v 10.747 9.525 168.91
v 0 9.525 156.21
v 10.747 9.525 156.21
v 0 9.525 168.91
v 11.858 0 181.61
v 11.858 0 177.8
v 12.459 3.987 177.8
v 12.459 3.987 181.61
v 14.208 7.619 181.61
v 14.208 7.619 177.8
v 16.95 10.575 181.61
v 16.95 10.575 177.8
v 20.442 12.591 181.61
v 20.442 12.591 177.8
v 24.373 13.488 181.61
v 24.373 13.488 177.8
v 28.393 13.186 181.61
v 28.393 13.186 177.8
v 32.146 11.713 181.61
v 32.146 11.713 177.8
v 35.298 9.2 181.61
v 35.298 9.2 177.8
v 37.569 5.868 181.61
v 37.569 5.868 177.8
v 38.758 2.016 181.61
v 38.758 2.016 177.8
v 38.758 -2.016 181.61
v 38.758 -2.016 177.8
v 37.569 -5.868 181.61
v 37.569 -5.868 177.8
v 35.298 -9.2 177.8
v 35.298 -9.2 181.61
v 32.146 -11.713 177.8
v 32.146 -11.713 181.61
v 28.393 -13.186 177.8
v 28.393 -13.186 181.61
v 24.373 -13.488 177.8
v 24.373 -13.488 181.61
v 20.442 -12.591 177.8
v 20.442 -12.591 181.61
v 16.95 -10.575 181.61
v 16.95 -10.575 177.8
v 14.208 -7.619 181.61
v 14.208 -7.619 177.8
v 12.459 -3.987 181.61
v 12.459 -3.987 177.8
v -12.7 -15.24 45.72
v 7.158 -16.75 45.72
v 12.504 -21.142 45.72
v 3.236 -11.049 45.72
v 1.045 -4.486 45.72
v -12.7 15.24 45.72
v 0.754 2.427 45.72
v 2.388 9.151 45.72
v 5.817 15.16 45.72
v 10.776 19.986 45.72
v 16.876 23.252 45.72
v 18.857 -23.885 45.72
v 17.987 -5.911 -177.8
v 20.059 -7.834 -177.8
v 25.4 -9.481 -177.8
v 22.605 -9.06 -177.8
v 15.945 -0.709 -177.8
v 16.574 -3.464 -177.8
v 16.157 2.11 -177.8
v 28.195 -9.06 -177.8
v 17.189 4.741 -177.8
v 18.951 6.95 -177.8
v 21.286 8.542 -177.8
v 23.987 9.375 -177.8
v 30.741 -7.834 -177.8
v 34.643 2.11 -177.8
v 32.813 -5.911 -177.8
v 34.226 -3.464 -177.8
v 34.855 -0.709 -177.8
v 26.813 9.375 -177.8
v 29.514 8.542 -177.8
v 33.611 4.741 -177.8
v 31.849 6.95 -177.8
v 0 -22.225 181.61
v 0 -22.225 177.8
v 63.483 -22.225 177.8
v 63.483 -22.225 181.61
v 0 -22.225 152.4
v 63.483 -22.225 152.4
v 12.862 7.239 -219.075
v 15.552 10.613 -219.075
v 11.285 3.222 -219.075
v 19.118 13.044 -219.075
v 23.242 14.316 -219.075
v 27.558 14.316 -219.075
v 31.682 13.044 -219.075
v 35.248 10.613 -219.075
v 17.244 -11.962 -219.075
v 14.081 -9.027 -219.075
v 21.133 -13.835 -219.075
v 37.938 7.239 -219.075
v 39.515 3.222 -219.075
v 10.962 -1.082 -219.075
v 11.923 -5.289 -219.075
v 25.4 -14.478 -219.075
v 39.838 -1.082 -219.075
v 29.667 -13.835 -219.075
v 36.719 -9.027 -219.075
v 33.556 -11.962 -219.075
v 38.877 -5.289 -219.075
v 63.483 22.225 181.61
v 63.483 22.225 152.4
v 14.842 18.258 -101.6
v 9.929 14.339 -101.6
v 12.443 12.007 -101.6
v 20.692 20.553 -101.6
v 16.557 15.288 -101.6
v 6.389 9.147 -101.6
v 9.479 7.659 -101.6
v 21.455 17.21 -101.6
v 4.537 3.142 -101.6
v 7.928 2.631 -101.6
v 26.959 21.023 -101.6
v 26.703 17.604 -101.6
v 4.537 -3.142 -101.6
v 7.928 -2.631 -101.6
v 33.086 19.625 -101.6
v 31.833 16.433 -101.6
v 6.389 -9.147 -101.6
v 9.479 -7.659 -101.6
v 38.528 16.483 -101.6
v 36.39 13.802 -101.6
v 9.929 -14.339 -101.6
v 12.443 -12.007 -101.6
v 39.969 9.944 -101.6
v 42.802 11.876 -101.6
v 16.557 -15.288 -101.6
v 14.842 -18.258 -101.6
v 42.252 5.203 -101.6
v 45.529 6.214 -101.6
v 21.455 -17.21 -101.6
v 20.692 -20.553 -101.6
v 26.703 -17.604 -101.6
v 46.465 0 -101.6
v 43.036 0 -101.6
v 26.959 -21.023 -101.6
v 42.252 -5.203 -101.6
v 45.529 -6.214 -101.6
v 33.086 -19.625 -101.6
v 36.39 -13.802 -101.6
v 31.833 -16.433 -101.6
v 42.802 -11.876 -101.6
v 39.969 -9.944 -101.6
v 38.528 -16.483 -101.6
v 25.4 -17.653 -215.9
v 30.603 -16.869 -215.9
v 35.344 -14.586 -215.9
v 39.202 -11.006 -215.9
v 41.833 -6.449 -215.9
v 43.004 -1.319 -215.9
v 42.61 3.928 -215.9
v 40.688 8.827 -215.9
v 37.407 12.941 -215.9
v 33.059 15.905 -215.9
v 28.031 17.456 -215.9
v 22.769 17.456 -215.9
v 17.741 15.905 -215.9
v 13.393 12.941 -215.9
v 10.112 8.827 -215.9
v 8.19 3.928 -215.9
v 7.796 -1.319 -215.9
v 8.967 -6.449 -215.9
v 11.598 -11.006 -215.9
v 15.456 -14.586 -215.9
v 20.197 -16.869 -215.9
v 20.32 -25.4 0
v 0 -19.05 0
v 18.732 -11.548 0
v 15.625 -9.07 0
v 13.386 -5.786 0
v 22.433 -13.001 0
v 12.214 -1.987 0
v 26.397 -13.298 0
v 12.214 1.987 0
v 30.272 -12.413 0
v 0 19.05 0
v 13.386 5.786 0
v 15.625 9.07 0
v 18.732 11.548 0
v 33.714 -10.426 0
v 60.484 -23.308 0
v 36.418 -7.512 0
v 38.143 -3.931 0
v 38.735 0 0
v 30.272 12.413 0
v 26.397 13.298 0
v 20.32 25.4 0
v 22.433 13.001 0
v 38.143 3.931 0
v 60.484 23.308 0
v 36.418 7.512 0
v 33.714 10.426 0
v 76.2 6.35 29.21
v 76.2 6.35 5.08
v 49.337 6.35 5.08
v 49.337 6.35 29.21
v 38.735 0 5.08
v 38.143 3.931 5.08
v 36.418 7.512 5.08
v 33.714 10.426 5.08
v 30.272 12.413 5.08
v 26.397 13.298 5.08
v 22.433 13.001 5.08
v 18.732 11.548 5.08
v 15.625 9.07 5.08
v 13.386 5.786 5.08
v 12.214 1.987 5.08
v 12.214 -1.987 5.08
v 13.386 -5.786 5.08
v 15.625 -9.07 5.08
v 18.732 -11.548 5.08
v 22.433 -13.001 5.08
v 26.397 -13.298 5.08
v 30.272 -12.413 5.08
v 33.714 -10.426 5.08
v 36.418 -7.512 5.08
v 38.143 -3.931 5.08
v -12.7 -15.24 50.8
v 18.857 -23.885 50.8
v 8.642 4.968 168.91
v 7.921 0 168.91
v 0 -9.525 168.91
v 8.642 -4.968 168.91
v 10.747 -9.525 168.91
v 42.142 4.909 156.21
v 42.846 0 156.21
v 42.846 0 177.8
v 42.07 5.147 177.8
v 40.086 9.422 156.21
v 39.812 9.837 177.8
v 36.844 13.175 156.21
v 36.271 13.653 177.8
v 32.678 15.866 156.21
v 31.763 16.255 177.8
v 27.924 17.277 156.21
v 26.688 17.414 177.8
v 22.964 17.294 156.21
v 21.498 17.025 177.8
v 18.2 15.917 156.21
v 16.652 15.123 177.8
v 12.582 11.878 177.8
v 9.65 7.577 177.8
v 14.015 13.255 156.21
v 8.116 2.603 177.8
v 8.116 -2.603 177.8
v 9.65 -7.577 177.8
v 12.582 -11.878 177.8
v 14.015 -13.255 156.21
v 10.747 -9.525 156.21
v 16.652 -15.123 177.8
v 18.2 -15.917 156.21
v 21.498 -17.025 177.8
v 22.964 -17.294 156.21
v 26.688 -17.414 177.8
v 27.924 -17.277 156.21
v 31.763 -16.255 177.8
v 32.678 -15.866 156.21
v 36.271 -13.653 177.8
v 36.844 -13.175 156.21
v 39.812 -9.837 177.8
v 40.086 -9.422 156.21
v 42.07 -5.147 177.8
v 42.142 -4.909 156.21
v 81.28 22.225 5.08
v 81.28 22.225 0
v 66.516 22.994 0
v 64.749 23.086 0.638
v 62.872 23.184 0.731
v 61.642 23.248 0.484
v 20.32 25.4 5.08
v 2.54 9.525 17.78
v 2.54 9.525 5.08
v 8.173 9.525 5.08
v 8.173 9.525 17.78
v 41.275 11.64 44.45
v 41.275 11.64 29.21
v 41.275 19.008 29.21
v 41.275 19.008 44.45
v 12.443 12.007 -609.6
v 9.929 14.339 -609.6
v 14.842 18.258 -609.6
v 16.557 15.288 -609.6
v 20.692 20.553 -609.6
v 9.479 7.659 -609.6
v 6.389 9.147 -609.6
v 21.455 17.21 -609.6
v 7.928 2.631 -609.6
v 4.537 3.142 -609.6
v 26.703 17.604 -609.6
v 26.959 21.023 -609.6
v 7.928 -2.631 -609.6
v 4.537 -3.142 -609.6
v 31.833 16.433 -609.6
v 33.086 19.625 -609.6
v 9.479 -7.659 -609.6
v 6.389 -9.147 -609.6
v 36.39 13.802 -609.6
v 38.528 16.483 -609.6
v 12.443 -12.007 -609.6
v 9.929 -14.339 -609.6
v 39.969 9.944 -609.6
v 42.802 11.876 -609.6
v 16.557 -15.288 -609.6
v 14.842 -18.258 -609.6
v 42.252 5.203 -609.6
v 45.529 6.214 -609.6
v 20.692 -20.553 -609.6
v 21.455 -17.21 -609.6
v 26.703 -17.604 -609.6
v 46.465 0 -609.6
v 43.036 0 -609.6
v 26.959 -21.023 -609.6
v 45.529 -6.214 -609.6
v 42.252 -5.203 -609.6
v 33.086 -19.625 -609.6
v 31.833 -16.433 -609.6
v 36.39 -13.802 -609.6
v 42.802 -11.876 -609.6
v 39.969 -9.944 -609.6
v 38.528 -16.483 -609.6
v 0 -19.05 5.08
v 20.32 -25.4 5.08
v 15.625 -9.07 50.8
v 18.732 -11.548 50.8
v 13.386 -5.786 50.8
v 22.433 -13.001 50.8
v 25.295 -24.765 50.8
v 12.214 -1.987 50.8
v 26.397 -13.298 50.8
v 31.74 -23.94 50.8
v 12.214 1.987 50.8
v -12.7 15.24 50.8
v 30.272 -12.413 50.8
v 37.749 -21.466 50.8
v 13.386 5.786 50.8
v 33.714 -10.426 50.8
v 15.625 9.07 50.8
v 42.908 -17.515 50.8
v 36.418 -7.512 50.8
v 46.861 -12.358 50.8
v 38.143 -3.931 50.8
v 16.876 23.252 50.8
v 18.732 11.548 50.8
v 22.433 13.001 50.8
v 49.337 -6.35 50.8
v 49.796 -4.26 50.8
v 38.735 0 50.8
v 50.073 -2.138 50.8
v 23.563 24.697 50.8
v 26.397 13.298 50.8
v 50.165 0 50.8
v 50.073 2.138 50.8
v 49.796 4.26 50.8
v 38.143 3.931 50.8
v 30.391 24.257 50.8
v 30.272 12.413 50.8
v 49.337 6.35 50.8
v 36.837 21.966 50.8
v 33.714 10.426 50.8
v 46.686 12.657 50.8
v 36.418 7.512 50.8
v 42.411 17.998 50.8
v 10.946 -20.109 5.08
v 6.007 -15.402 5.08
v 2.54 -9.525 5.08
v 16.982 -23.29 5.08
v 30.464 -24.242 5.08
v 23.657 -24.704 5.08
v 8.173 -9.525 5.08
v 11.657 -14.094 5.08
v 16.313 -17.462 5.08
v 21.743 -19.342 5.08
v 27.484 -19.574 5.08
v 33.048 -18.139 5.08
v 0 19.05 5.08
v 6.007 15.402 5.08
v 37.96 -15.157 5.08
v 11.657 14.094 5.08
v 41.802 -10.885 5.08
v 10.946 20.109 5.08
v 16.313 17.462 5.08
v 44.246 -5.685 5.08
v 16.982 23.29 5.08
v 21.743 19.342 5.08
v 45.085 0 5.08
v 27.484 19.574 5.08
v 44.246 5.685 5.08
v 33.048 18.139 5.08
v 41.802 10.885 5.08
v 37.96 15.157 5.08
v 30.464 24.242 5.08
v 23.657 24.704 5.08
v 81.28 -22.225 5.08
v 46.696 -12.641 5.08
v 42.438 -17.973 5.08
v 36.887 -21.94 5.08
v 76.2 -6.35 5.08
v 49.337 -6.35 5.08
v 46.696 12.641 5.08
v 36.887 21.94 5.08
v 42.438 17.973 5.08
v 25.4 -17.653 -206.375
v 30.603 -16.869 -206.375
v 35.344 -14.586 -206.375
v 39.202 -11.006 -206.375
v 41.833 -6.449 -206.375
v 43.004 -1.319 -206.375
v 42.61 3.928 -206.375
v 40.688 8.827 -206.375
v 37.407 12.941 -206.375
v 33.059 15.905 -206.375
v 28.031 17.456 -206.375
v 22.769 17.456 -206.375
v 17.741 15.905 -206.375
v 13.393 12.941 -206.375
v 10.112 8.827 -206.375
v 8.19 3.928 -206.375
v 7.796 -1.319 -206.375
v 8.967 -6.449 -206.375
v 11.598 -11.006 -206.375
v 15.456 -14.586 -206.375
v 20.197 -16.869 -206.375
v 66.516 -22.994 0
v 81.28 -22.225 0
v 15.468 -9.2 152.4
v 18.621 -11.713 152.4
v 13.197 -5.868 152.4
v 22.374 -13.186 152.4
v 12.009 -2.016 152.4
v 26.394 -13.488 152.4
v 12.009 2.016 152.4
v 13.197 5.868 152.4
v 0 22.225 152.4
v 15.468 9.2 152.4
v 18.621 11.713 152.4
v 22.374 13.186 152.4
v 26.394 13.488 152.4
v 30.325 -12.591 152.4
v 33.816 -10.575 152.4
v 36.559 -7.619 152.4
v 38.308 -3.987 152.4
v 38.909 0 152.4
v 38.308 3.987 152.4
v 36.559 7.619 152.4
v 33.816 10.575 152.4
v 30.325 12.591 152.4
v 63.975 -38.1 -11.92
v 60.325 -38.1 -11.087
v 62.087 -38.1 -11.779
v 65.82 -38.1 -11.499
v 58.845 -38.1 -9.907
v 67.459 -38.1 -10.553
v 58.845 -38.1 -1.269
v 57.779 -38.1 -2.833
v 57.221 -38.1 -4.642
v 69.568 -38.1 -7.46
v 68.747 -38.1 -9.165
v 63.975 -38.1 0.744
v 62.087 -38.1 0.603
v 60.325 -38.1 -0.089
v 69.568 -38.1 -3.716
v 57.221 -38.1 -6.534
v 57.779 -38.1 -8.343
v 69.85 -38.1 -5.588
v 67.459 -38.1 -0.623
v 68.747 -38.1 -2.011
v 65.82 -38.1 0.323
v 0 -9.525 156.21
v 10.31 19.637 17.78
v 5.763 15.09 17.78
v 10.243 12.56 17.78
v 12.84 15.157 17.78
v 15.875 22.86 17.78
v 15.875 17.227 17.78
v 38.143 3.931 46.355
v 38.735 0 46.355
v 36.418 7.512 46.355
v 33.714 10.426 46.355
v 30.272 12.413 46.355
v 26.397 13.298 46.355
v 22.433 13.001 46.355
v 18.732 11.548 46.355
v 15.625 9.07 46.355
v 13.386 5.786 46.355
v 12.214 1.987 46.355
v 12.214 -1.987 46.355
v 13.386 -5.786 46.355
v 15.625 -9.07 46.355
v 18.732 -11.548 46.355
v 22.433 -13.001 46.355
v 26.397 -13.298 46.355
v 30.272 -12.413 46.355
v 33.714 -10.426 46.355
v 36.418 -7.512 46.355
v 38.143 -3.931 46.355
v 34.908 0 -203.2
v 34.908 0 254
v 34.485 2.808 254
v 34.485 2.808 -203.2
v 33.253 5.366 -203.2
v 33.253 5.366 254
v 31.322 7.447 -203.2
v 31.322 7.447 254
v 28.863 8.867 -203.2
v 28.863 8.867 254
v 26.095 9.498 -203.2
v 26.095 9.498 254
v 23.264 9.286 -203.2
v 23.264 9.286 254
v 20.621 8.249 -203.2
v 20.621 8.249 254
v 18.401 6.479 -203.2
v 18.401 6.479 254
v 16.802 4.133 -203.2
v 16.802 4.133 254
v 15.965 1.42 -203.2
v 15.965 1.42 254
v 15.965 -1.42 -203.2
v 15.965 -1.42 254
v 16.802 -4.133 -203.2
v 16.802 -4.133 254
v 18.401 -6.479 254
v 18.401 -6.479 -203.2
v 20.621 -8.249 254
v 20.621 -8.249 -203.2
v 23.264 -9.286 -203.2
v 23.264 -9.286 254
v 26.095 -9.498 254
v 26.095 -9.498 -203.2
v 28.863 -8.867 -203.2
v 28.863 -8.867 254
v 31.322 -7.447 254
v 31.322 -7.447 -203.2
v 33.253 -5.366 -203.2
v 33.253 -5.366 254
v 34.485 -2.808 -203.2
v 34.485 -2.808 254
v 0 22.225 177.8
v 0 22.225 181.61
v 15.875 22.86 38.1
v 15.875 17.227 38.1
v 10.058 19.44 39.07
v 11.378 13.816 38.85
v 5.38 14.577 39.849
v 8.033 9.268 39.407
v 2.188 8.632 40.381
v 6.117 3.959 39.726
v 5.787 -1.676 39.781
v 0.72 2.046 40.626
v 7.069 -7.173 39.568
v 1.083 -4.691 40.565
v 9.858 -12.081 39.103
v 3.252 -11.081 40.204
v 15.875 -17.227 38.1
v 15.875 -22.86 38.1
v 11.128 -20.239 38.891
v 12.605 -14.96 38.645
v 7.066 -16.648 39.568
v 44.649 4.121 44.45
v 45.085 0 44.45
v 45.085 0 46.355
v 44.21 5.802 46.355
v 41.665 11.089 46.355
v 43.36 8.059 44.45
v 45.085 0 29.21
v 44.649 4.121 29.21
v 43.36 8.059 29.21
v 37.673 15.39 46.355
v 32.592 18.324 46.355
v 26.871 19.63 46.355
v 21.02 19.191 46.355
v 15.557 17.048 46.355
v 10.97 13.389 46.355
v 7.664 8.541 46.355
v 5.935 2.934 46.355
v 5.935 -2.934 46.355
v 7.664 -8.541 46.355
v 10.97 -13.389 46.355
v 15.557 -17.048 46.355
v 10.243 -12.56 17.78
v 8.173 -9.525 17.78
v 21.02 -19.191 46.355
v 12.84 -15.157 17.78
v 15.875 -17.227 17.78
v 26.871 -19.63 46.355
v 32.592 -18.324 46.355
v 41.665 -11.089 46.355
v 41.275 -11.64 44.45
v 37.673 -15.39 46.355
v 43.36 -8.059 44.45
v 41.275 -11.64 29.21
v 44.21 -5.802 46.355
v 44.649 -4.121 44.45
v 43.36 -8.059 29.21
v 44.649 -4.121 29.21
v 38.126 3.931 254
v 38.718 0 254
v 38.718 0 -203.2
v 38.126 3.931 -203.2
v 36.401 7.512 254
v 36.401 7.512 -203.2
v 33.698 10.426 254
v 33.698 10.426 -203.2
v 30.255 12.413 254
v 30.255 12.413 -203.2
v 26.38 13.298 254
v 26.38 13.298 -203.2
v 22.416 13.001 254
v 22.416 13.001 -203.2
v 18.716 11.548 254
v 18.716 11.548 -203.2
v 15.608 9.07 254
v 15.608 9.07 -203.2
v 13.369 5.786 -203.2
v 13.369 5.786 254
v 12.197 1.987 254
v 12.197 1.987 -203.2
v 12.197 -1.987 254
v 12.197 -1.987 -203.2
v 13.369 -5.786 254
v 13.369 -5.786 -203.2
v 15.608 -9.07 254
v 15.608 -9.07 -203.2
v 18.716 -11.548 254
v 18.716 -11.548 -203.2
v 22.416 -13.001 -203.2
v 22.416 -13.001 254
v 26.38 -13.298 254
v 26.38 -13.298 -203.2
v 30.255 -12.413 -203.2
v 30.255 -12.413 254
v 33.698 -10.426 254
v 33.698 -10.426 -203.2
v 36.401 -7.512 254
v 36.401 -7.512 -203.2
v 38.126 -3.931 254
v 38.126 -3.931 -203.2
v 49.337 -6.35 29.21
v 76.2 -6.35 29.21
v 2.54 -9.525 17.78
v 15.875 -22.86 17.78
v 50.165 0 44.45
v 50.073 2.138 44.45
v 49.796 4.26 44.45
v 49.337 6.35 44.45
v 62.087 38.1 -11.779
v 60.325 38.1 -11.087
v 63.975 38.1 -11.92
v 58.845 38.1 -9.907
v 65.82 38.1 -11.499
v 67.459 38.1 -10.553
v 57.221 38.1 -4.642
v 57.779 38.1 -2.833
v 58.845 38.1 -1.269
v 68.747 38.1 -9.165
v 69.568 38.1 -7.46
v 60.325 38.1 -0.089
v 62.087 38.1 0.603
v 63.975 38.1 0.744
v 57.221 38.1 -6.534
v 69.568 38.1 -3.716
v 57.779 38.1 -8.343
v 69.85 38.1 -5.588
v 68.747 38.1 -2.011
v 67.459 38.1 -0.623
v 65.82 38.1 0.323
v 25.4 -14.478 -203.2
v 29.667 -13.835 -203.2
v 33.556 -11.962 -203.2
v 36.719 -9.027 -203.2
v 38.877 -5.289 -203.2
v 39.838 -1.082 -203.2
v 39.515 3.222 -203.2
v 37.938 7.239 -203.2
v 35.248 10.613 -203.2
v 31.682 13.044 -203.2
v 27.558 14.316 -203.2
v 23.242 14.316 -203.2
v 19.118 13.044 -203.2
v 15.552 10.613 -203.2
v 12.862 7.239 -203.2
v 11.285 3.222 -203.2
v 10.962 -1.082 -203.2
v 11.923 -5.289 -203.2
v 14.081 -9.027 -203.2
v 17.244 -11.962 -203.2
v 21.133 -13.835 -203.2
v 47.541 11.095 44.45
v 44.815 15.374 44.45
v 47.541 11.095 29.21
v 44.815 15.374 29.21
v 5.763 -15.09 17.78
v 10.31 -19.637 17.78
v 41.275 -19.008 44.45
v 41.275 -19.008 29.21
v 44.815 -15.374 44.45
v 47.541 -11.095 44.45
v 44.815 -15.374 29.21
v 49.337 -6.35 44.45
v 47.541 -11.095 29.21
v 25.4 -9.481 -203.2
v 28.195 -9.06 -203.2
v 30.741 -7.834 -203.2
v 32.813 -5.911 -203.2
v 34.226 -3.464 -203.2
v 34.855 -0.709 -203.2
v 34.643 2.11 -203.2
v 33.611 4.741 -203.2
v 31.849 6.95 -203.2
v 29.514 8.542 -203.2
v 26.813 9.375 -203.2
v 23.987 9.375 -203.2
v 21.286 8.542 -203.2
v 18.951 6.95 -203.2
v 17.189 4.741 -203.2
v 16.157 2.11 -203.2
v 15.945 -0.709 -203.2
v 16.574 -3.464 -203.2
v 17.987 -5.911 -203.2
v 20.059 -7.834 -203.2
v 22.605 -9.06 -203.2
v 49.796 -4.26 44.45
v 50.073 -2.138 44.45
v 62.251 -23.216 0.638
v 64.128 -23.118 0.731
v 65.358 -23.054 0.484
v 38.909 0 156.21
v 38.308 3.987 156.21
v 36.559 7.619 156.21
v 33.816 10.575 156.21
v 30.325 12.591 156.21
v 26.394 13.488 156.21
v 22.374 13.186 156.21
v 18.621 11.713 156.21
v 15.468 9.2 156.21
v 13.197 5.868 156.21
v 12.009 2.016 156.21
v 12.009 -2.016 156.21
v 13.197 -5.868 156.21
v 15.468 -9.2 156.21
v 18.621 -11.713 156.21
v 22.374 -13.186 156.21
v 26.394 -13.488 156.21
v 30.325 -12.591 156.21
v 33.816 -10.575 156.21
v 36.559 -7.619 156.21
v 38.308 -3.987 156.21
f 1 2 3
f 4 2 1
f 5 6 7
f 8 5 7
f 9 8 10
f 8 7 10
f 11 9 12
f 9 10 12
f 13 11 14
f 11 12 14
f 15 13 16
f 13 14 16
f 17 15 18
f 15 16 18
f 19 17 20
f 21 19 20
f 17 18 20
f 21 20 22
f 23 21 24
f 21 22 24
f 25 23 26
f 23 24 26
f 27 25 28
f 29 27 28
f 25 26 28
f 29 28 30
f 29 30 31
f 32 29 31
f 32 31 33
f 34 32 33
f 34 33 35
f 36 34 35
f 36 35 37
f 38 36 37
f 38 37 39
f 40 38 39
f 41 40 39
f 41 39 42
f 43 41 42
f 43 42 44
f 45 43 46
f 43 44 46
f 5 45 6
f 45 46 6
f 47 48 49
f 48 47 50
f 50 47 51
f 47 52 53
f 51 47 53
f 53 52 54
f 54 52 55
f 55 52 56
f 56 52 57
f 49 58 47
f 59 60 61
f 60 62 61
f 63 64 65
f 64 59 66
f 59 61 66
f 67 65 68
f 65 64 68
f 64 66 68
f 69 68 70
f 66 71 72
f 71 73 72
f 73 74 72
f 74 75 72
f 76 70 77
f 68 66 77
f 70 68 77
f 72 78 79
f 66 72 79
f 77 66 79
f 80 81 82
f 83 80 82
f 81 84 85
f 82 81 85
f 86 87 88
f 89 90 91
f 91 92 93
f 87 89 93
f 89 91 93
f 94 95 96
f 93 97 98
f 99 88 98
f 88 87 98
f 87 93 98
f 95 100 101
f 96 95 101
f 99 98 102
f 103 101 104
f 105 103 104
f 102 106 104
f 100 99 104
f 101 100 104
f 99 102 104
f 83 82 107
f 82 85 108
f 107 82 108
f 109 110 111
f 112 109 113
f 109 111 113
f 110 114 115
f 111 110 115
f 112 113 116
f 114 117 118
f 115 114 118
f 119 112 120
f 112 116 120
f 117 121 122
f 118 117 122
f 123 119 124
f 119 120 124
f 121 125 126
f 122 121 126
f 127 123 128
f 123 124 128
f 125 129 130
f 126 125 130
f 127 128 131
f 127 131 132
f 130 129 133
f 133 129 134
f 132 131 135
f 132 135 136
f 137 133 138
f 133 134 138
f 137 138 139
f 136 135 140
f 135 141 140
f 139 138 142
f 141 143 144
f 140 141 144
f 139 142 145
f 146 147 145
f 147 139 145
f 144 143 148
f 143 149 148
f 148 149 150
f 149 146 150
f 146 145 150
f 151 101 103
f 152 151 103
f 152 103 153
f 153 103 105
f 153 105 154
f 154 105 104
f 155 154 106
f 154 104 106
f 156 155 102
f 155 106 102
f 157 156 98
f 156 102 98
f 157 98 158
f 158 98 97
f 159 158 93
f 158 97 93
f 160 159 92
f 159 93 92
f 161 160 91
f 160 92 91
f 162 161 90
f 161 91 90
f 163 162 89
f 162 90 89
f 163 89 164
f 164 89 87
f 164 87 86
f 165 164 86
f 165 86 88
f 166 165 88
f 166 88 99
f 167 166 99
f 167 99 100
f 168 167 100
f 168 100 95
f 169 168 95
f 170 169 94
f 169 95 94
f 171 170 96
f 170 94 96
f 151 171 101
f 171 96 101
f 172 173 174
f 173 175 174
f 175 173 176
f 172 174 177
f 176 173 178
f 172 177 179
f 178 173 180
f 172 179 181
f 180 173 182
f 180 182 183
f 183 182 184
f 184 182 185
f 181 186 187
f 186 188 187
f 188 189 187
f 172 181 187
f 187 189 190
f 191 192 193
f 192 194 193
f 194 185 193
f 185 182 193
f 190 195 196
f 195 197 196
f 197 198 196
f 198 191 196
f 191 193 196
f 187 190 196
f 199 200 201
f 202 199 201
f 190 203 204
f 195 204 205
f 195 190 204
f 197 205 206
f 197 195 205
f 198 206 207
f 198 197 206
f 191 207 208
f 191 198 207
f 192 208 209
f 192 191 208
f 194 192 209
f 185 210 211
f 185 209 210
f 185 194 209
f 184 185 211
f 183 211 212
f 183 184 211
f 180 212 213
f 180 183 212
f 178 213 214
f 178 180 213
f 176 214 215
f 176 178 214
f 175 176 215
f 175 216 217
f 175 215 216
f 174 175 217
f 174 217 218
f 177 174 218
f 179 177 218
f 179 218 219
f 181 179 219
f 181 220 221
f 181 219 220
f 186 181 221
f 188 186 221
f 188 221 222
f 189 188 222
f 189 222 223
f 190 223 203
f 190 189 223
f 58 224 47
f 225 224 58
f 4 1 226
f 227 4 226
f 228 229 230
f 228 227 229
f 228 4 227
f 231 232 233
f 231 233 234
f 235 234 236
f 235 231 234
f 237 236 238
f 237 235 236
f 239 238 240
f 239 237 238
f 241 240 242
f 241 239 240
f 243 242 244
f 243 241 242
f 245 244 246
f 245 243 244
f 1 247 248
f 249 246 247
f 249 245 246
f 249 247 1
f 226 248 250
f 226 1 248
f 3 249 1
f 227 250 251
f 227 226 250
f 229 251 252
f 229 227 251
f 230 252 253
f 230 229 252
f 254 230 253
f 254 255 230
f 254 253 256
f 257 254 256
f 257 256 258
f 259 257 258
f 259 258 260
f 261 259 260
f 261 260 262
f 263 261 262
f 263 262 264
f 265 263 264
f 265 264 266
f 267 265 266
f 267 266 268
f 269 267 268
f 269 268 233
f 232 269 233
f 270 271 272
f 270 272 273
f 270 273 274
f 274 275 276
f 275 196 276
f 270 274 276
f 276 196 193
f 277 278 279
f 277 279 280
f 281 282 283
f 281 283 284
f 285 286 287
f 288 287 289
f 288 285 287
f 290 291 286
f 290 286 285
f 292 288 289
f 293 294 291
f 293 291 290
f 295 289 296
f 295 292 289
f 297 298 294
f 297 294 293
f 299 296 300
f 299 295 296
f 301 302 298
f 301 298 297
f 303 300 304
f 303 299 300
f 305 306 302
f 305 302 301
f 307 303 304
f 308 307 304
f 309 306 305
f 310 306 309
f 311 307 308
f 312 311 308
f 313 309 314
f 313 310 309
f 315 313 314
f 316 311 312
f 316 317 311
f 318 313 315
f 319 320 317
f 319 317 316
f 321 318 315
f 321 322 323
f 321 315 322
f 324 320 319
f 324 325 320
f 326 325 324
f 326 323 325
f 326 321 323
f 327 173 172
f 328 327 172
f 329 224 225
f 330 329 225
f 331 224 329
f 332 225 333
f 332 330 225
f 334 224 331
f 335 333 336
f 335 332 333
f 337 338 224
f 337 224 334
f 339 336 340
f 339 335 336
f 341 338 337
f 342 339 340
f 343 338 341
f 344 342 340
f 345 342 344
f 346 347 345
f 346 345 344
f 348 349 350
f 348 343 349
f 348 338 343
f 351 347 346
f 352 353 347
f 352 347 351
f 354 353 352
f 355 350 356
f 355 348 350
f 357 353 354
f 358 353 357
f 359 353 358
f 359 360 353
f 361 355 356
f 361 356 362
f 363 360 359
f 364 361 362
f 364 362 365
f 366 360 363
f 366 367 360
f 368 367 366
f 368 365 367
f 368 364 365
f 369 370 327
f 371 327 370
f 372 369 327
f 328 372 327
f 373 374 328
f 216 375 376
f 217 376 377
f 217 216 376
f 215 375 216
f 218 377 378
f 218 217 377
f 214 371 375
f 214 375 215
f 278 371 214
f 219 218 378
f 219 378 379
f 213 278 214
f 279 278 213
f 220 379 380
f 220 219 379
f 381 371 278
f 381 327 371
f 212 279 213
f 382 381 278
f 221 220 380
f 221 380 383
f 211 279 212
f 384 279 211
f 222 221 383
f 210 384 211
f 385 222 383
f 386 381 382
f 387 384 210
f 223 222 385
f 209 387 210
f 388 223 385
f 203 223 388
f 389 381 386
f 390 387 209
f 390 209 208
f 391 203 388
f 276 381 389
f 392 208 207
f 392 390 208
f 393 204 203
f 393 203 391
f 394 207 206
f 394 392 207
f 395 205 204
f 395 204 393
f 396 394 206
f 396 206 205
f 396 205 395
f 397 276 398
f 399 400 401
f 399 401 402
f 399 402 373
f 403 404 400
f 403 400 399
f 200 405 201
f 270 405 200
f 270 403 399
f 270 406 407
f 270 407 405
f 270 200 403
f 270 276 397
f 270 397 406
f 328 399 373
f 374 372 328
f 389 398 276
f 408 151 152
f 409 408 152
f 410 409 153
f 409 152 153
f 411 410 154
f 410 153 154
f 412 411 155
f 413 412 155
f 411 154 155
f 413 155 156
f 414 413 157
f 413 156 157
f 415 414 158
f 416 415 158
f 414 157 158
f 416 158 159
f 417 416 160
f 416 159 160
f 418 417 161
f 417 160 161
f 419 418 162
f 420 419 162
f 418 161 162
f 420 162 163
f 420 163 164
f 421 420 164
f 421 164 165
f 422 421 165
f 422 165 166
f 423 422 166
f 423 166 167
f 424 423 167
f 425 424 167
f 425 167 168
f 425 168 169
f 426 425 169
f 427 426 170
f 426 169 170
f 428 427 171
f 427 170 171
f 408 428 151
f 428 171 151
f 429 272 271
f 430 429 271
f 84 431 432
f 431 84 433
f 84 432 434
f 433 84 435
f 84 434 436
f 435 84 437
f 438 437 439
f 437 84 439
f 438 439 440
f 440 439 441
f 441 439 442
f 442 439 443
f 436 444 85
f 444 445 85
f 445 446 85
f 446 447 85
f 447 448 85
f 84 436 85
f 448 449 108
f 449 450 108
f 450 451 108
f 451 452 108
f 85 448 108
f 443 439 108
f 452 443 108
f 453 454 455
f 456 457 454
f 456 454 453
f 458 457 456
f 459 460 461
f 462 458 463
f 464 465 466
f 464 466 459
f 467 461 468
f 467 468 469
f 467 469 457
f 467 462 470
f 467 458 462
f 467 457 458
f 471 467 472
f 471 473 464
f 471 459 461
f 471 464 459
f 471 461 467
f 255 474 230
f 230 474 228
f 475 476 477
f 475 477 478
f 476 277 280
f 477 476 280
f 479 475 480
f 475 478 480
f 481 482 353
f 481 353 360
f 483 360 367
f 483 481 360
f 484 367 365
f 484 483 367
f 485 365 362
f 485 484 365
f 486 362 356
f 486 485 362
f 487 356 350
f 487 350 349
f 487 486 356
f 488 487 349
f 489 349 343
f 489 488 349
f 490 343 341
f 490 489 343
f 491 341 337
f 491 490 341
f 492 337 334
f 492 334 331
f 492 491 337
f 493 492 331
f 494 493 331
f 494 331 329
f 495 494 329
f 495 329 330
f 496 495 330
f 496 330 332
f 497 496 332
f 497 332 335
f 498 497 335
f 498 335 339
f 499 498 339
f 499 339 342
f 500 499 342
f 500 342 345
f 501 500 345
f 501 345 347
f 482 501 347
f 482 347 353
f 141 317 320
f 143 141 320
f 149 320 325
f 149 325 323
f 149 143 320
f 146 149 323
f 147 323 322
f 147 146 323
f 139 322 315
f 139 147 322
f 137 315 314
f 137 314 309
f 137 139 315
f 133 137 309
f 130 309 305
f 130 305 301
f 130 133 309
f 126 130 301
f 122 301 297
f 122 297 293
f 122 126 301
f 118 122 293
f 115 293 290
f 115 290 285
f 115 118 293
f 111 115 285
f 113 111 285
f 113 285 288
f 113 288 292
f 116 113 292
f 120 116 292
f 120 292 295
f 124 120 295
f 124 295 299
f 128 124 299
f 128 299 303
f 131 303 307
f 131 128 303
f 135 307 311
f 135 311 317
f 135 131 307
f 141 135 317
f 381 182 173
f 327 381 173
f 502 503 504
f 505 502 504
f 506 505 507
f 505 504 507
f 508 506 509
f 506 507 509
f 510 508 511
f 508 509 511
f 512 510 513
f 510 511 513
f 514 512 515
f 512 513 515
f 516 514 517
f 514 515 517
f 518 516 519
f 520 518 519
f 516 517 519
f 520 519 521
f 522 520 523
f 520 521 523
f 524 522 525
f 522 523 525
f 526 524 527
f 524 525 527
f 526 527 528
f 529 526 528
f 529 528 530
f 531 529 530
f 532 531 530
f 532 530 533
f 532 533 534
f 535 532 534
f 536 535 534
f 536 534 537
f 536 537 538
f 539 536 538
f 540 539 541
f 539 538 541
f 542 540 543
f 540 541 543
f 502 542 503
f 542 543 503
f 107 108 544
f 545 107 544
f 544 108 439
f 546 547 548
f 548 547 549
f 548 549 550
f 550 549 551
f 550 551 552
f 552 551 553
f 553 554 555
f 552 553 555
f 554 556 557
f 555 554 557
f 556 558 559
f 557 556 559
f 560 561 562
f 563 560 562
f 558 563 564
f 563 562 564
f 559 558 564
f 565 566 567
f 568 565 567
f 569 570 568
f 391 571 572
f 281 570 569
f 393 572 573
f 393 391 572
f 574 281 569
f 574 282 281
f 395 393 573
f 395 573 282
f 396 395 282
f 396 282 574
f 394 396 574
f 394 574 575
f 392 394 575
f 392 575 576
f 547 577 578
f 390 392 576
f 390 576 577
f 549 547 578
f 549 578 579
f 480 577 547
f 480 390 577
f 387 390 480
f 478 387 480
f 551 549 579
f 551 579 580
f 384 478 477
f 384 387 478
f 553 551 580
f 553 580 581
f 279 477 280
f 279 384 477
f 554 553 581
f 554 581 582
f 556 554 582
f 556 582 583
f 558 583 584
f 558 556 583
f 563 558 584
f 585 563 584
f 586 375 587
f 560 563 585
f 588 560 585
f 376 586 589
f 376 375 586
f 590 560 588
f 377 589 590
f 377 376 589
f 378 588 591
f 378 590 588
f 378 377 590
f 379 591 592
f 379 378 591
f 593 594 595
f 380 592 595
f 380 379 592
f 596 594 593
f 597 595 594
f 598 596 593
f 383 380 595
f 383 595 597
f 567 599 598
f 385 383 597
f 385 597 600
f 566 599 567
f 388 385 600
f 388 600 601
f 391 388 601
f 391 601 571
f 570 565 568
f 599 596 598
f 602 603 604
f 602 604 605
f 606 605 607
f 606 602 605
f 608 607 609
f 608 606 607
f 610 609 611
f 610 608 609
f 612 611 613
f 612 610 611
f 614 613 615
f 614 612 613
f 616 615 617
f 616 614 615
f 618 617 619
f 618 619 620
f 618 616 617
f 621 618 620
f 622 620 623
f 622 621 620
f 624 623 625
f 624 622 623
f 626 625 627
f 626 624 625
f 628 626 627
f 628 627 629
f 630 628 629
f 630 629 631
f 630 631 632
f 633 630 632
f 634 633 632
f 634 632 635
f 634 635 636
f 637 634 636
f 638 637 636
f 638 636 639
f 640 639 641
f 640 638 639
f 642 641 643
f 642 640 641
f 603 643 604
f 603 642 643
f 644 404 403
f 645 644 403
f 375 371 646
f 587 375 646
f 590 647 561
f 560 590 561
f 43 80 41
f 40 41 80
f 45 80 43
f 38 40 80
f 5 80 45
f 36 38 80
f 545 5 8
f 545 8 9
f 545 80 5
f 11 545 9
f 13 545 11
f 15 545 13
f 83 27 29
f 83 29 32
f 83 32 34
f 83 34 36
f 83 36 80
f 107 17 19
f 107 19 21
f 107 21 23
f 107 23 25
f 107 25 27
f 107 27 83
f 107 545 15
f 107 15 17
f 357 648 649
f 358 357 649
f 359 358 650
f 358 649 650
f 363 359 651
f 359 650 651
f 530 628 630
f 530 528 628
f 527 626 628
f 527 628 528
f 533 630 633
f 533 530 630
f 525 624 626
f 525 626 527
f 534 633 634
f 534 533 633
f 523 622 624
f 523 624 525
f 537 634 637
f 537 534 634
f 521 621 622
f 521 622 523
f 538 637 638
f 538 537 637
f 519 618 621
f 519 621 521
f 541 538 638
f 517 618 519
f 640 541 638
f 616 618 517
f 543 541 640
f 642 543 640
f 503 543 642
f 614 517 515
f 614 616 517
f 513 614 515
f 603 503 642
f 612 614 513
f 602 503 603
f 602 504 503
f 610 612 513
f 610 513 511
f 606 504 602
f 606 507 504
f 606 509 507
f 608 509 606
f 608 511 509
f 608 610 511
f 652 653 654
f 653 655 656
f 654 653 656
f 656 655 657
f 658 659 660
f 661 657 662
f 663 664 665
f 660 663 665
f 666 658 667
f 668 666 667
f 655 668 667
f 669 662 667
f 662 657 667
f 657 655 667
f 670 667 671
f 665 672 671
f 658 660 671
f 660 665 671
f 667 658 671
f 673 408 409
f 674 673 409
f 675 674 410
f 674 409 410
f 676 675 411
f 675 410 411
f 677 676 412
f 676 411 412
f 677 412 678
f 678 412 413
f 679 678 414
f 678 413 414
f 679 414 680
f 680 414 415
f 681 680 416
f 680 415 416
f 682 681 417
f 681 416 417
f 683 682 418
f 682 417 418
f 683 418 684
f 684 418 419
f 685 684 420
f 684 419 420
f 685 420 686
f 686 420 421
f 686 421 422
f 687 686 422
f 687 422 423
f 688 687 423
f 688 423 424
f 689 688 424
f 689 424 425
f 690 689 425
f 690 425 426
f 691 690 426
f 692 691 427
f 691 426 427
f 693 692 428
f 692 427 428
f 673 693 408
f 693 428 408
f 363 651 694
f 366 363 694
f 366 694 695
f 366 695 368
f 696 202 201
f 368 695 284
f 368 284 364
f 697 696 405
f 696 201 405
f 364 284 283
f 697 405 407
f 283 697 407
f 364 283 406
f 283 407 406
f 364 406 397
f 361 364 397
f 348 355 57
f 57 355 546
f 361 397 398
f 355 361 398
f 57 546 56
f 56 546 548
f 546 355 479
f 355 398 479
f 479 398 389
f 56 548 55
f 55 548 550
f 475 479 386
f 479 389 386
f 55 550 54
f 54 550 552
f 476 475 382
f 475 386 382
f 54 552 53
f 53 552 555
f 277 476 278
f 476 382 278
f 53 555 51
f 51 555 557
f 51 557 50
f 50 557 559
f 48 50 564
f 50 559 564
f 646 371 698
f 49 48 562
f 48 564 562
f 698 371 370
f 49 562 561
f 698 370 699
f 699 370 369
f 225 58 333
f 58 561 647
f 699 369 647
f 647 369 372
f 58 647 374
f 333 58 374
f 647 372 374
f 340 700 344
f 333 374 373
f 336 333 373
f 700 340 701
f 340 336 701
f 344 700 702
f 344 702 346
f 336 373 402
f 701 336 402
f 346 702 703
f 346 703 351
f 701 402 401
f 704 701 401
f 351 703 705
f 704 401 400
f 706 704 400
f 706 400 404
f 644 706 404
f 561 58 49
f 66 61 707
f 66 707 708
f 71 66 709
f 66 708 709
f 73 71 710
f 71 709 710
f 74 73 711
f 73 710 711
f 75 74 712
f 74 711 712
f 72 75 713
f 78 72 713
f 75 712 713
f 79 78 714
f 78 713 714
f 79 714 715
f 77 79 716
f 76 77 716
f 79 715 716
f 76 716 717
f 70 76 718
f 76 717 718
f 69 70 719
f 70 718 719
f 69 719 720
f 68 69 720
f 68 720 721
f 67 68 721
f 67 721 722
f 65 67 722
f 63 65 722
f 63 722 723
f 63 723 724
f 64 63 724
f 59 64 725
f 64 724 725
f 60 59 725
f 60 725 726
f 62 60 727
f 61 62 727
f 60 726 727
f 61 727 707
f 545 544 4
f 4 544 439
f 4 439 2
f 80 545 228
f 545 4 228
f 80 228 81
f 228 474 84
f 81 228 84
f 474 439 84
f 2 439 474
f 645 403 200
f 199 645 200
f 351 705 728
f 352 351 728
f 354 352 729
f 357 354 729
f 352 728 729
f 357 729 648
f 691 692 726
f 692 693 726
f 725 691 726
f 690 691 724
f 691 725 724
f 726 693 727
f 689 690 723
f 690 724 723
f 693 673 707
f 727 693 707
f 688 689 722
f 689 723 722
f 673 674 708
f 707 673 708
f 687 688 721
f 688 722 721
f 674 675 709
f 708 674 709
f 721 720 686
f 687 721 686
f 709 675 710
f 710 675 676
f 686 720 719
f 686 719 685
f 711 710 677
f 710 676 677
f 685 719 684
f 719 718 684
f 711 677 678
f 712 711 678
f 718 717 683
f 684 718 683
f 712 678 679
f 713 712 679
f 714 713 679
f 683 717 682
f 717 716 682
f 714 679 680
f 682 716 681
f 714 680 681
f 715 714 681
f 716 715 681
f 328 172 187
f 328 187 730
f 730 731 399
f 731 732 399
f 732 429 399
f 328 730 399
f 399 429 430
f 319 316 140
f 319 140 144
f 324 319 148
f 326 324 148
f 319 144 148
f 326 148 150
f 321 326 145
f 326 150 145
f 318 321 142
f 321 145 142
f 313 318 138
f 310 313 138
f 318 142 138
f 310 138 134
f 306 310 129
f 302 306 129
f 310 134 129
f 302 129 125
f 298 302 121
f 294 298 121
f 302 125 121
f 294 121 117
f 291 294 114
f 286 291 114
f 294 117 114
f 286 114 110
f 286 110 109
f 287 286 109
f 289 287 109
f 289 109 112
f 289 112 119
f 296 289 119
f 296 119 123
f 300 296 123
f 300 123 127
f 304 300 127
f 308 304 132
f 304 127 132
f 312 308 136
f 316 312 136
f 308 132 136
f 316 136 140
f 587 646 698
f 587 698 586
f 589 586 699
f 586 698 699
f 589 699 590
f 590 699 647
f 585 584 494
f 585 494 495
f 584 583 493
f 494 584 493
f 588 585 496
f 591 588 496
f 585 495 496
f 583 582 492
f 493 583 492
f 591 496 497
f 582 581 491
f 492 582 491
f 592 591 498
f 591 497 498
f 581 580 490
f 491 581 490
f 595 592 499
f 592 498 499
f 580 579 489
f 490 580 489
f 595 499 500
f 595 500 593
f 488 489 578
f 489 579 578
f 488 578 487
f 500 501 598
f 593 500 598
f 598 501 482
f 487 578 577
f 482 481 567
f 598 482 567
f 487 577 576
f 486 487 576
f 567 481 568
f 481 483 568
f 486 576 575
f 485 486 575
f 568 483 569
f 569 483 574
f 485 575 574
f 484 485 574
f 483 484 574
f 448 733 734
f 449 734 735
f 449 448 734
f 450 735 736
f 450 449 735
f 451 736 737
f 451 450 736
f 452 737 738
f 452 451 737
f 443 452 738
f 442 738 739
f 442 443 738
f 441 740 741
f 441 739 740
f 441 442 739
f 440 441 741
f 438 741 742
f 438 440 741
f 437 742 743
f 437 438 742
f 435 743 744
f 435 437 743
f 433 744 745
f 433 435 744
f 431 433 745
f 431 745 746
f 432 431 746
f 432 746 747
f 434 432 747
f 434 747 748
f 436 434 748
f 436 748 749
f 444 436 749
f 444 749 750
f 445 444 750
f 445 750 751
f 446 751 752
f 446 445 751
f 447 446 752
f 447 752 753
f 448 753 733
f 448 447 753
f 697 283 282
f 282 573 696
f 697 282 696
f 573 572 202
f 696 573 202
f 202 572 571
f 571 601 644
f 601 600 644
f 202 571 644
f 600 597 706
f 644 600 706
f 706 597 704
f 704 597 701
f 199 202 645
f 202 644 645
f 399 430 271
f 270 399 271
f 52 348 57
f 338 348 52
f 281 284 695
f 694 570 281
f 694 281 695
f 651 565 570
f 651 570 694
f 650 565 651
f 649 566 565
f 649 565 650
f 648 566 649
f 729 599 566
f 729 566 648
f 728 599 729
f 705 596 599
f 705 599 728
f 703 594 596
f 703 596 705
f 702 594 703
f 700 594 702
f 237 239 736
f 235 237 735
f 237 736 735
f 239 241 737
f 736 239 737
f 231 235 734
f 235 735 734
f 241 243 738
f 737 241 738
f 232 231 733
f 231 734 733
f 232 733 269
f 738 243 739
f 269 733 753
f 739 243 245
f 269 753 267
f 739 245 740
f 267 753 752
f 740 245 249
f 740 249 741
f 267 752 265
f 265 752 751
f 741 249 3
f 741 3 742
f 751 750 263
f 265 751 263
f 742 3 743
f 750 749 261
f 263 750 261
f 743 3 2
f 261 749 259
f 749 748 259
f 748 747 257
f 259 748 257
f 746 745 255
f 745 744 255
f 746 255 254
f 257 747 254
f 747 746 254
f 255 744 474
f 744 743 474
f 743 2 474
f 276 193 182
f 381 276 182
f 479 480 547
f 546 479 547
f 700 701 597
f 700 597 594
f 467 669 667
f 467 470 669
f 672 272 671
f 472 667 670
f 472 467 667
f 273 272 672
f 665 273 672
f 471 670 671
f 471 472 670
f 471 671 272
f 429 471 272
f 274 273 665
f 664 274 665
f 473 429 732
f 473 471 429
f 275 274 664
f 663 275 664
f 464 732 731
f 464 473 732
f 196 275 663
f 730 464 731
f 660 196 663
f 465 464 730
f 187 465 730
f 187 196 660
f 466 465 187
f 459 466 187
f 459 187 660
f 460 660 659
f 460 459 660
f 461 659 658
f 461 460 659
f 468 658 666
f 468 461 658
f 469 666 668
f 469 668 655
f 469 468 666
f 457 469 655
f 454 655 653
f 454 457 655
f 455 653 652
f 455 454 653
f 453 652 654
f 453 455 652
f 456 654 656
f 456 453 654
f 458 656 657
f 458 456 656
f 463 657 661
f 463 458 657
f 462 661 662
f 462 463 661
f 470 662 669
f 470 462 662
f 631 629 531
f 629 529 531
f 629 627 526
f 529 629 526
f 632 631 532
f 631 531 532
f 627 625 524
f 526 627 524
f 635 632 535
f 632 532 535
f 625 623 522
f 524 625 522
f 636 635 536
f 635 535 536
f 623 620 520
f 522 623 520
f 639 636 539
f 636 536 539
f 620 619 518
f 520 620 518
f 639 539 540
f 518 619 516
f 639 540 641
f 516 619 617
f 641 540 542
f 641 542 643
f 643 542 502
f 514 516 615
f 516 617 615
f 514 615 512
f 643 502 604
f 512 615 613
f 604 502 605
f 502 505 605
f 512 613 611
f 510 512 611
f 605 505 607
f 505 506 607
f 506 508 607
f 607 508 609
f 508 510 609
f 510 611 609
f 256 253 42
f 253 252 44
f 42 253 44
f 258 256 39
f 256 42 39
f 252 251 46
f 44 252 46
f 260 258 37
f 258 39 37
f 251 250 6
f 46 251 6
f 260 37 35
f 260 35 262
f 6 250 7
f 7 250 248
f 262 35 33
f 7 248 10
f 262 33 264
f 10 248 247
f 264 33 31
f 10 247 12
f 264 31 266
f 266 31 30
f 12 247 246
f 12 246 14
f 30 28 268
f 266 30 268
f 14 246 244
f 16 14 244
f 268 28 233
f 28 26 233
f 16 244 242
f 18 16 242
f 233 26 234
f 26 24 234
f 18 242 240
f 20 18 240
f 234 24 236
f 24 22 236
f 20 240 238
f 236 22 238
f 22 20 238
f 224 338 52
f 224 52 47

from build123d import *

# Parameters (mm, degrees)
F0_R      = 13.335
F1_DEPTH  = 5.08
F2_DEPTH  = 50.8
F3_DEPTH  = 29.21
F5_DEPTH  = 5.08
F6_R      = 19.685
F7_DEPTH  = 41.275
F9_R      = 13.335
F9_R_2    = 9.525
F10_DEPTH = 457.2
F12_W     = 26.8629424323
F12_H     = 15.24
F13_DEPTH = 50.801
F14_R     = 6.35
F15_DEPTH = 38.1
F16_R     = 7.925577889
F16_R_2   = 6.35
F17_DEPTH = 12.7
F18_W     = 19.05
F18_H     = 19.05
F19_DEPTH = 25.4
F21_R     = 21.082
F21_R_2   = 17.653
F22_DEPTH = 508
F26_SIZE  = 3.175
F28_W     = 63.4833923489
F28_H     = 44.45
F28_R     = 17.4625
F28_R_2   = 13.5255
F29_DEPTH = 3.81
F30_DEPTH = 25.4
F32_DEPTH = 3.81
F33_W     = 19.05
F33_H     = 12.7
F34_DEPTH = 25.4


with BuildPart() as f1:
    # F0 (on Top) → F1 (new body)
    with BuildSketch(Plane.XY):
        Polygon((20.32, 25.4), (0, 19.05), (0, -19.05), (20.32, -25.4), (81.28, -22.225), (81.28, 22.225), align=None)
        with BuildLine():
            ThreePointArc((49.3370575677, -6.35), (0.635, 0), (49.3370575677, 6.35))
            Line((49.3370575677, 6.35), (76.2, 6.35))
            Line((76.2, 6.35), (76.2, -6.35))
            Line((76.2, -6.35), (49.3370575677, -6.35))
        make_face(mode=Mode.SUBTRACT)
        with BuildLine():
            ThreePointArc((49.3370575677, 6.35), (49.9571420941, 3.2018740087), (50.165, 0))
            ThreePointArc((50.165, 0), (49.9571420941, -3.2018740087), (49.3370575677, -6.35))
            Line((49.3370575677, -6.35), (76.2, -6.35))
            Line((76.2, -6.35), (76.2, 6.35))
            Line((76.2, 6.35), (49.3370575677, 6.35))
        make_face()
        with BuildLine():
            ThreePointArc((49.3370575677, -6.35), (49.9571420941, -3.2018740087), (50.165, 0))
            ThreePointArc((50.165, 0), (49.9571420941, 3.2018740087), (49.3370575677, 6.35))
            ThreePointArc((49.3370575677, 6.35), (0.635, 0), (49.3370575677, -6.35))
        make_face()
        with Locations((25.4, 0)):
            Circle(F0_R, mode=Mode.SUBTRACT)
    extrude(amount=F1_DEPTH)

    # F0 (on Top) → F2 (join)
    with BuildSketch(Plane.XY):
        with BuildLine():
            ThreePointArc((49.3370575677, -6.35), (49.9571420941, -3.2018740087), (50.165, 0))
            ThreePointArc((50.165, 0), (49.9571420941, 3.2018740087), (49.3370575677, 6.35))
            ThreePointArc((49.3370575677, 6.35), (0.635, 0), (49.3370575677, -6.35))
        make_face()
        with Locations((25.4, 0)):
            Circle(F0_R, mode=Mode.SUBTRACT)
    extrude(amount=F2_DEPTH)

    # F0 (on Top) → F3 (join)
    with BuildSketch(Plane.XY):
        with BuildLine():
            ThreePointArc((49.3370575677, 6.35), (49.9571420941, 3.2018740087), (50.165, 0))
            ThreePointArc((50.165, 0), (49.9571420941, -3.2018740087), (49.3370575677, -6.35))
            Line((49.3370575677, -6.35), (76.2, -6.35))
            Line((76.2, -6.35), (76.2, 6.35))
            Line((76.2, 6.35), (49.3370575677, 6.35))
        make_face()
    extrude(amount=F3_DEPTH)

    # F4 (on face) → F5 (join)
    with BuildSketch(Plane.XY.offset(50.8)):
        with BuildLine():
            ThreePointArc((18.8567300583, -23.8849501459), (0.6568378159, -1.0397836945), (16.8759001326, 23.2517729743))
            Line((16.8759001326, 23.2517729743), (-12.7, 15.24))
            Line((-12.7, 15.24), (-12.7, -15.24))
            Line((-12.7, -15.24), (18.8567300583, -23.8849501459))
        make_face()
    extrude(amount=-F5_DEPTH)

    # F6 (on face) → F7 (cut)
    with BuildSketch(Plane.XY.offset(5.08)):
        with Locations((25.4, 0)):
            Circle(F6_R)
    extrude(amount=F7_DEPTH, mode=Mode.SUBTRACT)

    # F12 (on offset) → F13 (cut, through all)
    with BuildSketch(Plane.XZ.offset(25.4)):
        Polygon((-14.605, 43.18), (-14.605, 17.78), (15.875, 17.78), (15.875, 38.1), align=None)
        with Locations((54.7064712161, 36.83)):
            Rectangle(F12_W, F12_H)
    extrude(amount=-F13_DEPTH, mode=Mode.SUBTRACT)

    # F14 (on Front) → F15 (join, symmetric)
    with BuildSketch(Plane.XZ):
        with Locations((63.5, -5.588)):
            Circle(F14_R)
    extrude(amount=F15_DEPTH, both=True)

    # F16 (on face) → F17 (cut)
    with BuildSketch(Plane.XZ.offset(38.1)):
        with Locations((63.5, -5.588)):
            Circle(F16_R)
        with Locations((63.5, -5.588)):
            Circle(F16_R_2, mode=Mode.SUBTRACT)
    extrude(amount=-F17_DEPTH, mode=Mode.SUBTRACT)

    # F18 (on Right) → F19 (cut)
    with BuildSketch(Plane.YZ):
        with Locations((0, 14.605)):
            Rectangle(F18_W, F18_H)
    extrude(amount=F19_DEPTH, mode=Mode.SUBTRACT)


with BuildPart() as f10:
    # F9 (on offset) → F10 (new body)
    with BuildSketch(Plane.XY.offset(254)):
        with Locations((25.3833923489, 0)):
            Circle(F9_R)
        with Locations((25.3833923489, 0)):
            Circle(F9_R_2, mode=Mode.SUBTRACT)
    extrude(amount=-F10_DEPTH)


with BuildPart() as f22:
    # F21 (on offset) → F22 (new body)
    with BuildSketch(Plane(origin=(0, 0, -101.6), x_dir=(1, 0, 0), z_dir=(0, 0, -1))):
        with Locations((25.3833923489, 0)):
            Circle(F21_R)
        with Locations((25.3833923489, 0)):
            Circle(F21_R_2, mode=Mode.SUBTRACT)
    extrude(amount=F22_DEPTH)


with BuildPart() as f25:
    # F24 (on plane+point) → F25 (revolve)
    with BuildSketch(Plane.YZ.offset(25.4)):
        Polygon((0, -177.8), (-9.4810361043, -177.8), (-9.4810361043, -203.2), (-17.653, -203.2), (-17.653, -219.075), (0, -219.075), align=None)
    revolve(axis=Axis((25.4, 0, -198.4375), (0, 0, 1)))

    # F26
    f26_edges = [f25.edges().sort_by_distance(p)[0] for p in [
        (25.4, 17.653, -219.075),
        (25.4, 17.653, -203.2),
    ]]
    chamfer(f26_edges, length=F26_SIZE)


with BuildPart() as f29:
    # F28 (on offset) → F29 (new body)
    with BuildSketch(Plane.XY.offset(152.4)):
        with Locations((31.7416961744, 0)):
            Rectangle(F28_W, F28_H)
        with Locations((25.3833923489, 0)):
            Circle(F28_R, mode=Mode.SUBTRACT)
        with Locations((25.3833923489, 0)):
            Circle(F28_R)
        with Locations((25.3833923489, 0)):
            Circle(F28_R_2, mode=Mode.SUBTRACT)
    extrude(amount=F29_DEPTH)

    # F28 (on offset) → F30 (join)
    with BuildSketch(Plane.XY.offset(152.4)):
        with Locations((31.7416961744, 0)):
            Rectangle(F28_W, F28_H)
        with Locations((25.3833923489, 0)):
            Circle(F28_R, mode=Mode.SUBTRACT)
    extrude(amount=F30_DEPTH)

    # F31 (on face) → F32 (join)
    with BuildSketch(Plane.XY.offset(177.8)):
        Polygon((63.4833923489, 22.225), (0, 22.225), (0, 0), (0, -22.225), (63.4833923489, -22.225), align=None)
        with BuildLine():
            ThreePointArc((42.8458923489, 0), (25.3833923489, -17.4625), (7.9208923489, 0))
            ThreePointArc((7.9208923489, 0), (25.3833923489, 17.4625), (42.8458923489, 0))
        make_face(mode=Mode.SUBTRACT)
        with BuildLine():
            ThreePointArc((42.8458923489, 0), (25.3833923489, 17.4625), (7.9208923489, 0))
            ThreePointArc((7.9208923489, 0), (25.3833923489, -17.4625), (42.8458923489, 0))
        make_face()
        with BuildLine():
            ThreePointArc((38.9088923489, 0), (25.3833923489, -13.5255), (11.8578923489, 0))
            ThreePointArc((11.8578923489, 0), (25.3833923489, 13.5255), (38.9088923489, 0))
        make_face(mode=Mode.SUBTRACT)
    extrude(amount=F32_DEPTH)

    # F33 (on face) → F34 (cut)
    with BuildSketch(Plane(origin=(0, 0, 0), x_dir=(0, -1, 0), z_dir=(-1, 0, 0))):
        with Locations((0, 162.56)):
            Rectangle(F33_W, F33_H)
    extrude(amount=-F34_DEPTH, mode=Mode.SUBTRACT)


solid = Compound([f1.part, f10.part, f22.part, f25.part, f29.part])
